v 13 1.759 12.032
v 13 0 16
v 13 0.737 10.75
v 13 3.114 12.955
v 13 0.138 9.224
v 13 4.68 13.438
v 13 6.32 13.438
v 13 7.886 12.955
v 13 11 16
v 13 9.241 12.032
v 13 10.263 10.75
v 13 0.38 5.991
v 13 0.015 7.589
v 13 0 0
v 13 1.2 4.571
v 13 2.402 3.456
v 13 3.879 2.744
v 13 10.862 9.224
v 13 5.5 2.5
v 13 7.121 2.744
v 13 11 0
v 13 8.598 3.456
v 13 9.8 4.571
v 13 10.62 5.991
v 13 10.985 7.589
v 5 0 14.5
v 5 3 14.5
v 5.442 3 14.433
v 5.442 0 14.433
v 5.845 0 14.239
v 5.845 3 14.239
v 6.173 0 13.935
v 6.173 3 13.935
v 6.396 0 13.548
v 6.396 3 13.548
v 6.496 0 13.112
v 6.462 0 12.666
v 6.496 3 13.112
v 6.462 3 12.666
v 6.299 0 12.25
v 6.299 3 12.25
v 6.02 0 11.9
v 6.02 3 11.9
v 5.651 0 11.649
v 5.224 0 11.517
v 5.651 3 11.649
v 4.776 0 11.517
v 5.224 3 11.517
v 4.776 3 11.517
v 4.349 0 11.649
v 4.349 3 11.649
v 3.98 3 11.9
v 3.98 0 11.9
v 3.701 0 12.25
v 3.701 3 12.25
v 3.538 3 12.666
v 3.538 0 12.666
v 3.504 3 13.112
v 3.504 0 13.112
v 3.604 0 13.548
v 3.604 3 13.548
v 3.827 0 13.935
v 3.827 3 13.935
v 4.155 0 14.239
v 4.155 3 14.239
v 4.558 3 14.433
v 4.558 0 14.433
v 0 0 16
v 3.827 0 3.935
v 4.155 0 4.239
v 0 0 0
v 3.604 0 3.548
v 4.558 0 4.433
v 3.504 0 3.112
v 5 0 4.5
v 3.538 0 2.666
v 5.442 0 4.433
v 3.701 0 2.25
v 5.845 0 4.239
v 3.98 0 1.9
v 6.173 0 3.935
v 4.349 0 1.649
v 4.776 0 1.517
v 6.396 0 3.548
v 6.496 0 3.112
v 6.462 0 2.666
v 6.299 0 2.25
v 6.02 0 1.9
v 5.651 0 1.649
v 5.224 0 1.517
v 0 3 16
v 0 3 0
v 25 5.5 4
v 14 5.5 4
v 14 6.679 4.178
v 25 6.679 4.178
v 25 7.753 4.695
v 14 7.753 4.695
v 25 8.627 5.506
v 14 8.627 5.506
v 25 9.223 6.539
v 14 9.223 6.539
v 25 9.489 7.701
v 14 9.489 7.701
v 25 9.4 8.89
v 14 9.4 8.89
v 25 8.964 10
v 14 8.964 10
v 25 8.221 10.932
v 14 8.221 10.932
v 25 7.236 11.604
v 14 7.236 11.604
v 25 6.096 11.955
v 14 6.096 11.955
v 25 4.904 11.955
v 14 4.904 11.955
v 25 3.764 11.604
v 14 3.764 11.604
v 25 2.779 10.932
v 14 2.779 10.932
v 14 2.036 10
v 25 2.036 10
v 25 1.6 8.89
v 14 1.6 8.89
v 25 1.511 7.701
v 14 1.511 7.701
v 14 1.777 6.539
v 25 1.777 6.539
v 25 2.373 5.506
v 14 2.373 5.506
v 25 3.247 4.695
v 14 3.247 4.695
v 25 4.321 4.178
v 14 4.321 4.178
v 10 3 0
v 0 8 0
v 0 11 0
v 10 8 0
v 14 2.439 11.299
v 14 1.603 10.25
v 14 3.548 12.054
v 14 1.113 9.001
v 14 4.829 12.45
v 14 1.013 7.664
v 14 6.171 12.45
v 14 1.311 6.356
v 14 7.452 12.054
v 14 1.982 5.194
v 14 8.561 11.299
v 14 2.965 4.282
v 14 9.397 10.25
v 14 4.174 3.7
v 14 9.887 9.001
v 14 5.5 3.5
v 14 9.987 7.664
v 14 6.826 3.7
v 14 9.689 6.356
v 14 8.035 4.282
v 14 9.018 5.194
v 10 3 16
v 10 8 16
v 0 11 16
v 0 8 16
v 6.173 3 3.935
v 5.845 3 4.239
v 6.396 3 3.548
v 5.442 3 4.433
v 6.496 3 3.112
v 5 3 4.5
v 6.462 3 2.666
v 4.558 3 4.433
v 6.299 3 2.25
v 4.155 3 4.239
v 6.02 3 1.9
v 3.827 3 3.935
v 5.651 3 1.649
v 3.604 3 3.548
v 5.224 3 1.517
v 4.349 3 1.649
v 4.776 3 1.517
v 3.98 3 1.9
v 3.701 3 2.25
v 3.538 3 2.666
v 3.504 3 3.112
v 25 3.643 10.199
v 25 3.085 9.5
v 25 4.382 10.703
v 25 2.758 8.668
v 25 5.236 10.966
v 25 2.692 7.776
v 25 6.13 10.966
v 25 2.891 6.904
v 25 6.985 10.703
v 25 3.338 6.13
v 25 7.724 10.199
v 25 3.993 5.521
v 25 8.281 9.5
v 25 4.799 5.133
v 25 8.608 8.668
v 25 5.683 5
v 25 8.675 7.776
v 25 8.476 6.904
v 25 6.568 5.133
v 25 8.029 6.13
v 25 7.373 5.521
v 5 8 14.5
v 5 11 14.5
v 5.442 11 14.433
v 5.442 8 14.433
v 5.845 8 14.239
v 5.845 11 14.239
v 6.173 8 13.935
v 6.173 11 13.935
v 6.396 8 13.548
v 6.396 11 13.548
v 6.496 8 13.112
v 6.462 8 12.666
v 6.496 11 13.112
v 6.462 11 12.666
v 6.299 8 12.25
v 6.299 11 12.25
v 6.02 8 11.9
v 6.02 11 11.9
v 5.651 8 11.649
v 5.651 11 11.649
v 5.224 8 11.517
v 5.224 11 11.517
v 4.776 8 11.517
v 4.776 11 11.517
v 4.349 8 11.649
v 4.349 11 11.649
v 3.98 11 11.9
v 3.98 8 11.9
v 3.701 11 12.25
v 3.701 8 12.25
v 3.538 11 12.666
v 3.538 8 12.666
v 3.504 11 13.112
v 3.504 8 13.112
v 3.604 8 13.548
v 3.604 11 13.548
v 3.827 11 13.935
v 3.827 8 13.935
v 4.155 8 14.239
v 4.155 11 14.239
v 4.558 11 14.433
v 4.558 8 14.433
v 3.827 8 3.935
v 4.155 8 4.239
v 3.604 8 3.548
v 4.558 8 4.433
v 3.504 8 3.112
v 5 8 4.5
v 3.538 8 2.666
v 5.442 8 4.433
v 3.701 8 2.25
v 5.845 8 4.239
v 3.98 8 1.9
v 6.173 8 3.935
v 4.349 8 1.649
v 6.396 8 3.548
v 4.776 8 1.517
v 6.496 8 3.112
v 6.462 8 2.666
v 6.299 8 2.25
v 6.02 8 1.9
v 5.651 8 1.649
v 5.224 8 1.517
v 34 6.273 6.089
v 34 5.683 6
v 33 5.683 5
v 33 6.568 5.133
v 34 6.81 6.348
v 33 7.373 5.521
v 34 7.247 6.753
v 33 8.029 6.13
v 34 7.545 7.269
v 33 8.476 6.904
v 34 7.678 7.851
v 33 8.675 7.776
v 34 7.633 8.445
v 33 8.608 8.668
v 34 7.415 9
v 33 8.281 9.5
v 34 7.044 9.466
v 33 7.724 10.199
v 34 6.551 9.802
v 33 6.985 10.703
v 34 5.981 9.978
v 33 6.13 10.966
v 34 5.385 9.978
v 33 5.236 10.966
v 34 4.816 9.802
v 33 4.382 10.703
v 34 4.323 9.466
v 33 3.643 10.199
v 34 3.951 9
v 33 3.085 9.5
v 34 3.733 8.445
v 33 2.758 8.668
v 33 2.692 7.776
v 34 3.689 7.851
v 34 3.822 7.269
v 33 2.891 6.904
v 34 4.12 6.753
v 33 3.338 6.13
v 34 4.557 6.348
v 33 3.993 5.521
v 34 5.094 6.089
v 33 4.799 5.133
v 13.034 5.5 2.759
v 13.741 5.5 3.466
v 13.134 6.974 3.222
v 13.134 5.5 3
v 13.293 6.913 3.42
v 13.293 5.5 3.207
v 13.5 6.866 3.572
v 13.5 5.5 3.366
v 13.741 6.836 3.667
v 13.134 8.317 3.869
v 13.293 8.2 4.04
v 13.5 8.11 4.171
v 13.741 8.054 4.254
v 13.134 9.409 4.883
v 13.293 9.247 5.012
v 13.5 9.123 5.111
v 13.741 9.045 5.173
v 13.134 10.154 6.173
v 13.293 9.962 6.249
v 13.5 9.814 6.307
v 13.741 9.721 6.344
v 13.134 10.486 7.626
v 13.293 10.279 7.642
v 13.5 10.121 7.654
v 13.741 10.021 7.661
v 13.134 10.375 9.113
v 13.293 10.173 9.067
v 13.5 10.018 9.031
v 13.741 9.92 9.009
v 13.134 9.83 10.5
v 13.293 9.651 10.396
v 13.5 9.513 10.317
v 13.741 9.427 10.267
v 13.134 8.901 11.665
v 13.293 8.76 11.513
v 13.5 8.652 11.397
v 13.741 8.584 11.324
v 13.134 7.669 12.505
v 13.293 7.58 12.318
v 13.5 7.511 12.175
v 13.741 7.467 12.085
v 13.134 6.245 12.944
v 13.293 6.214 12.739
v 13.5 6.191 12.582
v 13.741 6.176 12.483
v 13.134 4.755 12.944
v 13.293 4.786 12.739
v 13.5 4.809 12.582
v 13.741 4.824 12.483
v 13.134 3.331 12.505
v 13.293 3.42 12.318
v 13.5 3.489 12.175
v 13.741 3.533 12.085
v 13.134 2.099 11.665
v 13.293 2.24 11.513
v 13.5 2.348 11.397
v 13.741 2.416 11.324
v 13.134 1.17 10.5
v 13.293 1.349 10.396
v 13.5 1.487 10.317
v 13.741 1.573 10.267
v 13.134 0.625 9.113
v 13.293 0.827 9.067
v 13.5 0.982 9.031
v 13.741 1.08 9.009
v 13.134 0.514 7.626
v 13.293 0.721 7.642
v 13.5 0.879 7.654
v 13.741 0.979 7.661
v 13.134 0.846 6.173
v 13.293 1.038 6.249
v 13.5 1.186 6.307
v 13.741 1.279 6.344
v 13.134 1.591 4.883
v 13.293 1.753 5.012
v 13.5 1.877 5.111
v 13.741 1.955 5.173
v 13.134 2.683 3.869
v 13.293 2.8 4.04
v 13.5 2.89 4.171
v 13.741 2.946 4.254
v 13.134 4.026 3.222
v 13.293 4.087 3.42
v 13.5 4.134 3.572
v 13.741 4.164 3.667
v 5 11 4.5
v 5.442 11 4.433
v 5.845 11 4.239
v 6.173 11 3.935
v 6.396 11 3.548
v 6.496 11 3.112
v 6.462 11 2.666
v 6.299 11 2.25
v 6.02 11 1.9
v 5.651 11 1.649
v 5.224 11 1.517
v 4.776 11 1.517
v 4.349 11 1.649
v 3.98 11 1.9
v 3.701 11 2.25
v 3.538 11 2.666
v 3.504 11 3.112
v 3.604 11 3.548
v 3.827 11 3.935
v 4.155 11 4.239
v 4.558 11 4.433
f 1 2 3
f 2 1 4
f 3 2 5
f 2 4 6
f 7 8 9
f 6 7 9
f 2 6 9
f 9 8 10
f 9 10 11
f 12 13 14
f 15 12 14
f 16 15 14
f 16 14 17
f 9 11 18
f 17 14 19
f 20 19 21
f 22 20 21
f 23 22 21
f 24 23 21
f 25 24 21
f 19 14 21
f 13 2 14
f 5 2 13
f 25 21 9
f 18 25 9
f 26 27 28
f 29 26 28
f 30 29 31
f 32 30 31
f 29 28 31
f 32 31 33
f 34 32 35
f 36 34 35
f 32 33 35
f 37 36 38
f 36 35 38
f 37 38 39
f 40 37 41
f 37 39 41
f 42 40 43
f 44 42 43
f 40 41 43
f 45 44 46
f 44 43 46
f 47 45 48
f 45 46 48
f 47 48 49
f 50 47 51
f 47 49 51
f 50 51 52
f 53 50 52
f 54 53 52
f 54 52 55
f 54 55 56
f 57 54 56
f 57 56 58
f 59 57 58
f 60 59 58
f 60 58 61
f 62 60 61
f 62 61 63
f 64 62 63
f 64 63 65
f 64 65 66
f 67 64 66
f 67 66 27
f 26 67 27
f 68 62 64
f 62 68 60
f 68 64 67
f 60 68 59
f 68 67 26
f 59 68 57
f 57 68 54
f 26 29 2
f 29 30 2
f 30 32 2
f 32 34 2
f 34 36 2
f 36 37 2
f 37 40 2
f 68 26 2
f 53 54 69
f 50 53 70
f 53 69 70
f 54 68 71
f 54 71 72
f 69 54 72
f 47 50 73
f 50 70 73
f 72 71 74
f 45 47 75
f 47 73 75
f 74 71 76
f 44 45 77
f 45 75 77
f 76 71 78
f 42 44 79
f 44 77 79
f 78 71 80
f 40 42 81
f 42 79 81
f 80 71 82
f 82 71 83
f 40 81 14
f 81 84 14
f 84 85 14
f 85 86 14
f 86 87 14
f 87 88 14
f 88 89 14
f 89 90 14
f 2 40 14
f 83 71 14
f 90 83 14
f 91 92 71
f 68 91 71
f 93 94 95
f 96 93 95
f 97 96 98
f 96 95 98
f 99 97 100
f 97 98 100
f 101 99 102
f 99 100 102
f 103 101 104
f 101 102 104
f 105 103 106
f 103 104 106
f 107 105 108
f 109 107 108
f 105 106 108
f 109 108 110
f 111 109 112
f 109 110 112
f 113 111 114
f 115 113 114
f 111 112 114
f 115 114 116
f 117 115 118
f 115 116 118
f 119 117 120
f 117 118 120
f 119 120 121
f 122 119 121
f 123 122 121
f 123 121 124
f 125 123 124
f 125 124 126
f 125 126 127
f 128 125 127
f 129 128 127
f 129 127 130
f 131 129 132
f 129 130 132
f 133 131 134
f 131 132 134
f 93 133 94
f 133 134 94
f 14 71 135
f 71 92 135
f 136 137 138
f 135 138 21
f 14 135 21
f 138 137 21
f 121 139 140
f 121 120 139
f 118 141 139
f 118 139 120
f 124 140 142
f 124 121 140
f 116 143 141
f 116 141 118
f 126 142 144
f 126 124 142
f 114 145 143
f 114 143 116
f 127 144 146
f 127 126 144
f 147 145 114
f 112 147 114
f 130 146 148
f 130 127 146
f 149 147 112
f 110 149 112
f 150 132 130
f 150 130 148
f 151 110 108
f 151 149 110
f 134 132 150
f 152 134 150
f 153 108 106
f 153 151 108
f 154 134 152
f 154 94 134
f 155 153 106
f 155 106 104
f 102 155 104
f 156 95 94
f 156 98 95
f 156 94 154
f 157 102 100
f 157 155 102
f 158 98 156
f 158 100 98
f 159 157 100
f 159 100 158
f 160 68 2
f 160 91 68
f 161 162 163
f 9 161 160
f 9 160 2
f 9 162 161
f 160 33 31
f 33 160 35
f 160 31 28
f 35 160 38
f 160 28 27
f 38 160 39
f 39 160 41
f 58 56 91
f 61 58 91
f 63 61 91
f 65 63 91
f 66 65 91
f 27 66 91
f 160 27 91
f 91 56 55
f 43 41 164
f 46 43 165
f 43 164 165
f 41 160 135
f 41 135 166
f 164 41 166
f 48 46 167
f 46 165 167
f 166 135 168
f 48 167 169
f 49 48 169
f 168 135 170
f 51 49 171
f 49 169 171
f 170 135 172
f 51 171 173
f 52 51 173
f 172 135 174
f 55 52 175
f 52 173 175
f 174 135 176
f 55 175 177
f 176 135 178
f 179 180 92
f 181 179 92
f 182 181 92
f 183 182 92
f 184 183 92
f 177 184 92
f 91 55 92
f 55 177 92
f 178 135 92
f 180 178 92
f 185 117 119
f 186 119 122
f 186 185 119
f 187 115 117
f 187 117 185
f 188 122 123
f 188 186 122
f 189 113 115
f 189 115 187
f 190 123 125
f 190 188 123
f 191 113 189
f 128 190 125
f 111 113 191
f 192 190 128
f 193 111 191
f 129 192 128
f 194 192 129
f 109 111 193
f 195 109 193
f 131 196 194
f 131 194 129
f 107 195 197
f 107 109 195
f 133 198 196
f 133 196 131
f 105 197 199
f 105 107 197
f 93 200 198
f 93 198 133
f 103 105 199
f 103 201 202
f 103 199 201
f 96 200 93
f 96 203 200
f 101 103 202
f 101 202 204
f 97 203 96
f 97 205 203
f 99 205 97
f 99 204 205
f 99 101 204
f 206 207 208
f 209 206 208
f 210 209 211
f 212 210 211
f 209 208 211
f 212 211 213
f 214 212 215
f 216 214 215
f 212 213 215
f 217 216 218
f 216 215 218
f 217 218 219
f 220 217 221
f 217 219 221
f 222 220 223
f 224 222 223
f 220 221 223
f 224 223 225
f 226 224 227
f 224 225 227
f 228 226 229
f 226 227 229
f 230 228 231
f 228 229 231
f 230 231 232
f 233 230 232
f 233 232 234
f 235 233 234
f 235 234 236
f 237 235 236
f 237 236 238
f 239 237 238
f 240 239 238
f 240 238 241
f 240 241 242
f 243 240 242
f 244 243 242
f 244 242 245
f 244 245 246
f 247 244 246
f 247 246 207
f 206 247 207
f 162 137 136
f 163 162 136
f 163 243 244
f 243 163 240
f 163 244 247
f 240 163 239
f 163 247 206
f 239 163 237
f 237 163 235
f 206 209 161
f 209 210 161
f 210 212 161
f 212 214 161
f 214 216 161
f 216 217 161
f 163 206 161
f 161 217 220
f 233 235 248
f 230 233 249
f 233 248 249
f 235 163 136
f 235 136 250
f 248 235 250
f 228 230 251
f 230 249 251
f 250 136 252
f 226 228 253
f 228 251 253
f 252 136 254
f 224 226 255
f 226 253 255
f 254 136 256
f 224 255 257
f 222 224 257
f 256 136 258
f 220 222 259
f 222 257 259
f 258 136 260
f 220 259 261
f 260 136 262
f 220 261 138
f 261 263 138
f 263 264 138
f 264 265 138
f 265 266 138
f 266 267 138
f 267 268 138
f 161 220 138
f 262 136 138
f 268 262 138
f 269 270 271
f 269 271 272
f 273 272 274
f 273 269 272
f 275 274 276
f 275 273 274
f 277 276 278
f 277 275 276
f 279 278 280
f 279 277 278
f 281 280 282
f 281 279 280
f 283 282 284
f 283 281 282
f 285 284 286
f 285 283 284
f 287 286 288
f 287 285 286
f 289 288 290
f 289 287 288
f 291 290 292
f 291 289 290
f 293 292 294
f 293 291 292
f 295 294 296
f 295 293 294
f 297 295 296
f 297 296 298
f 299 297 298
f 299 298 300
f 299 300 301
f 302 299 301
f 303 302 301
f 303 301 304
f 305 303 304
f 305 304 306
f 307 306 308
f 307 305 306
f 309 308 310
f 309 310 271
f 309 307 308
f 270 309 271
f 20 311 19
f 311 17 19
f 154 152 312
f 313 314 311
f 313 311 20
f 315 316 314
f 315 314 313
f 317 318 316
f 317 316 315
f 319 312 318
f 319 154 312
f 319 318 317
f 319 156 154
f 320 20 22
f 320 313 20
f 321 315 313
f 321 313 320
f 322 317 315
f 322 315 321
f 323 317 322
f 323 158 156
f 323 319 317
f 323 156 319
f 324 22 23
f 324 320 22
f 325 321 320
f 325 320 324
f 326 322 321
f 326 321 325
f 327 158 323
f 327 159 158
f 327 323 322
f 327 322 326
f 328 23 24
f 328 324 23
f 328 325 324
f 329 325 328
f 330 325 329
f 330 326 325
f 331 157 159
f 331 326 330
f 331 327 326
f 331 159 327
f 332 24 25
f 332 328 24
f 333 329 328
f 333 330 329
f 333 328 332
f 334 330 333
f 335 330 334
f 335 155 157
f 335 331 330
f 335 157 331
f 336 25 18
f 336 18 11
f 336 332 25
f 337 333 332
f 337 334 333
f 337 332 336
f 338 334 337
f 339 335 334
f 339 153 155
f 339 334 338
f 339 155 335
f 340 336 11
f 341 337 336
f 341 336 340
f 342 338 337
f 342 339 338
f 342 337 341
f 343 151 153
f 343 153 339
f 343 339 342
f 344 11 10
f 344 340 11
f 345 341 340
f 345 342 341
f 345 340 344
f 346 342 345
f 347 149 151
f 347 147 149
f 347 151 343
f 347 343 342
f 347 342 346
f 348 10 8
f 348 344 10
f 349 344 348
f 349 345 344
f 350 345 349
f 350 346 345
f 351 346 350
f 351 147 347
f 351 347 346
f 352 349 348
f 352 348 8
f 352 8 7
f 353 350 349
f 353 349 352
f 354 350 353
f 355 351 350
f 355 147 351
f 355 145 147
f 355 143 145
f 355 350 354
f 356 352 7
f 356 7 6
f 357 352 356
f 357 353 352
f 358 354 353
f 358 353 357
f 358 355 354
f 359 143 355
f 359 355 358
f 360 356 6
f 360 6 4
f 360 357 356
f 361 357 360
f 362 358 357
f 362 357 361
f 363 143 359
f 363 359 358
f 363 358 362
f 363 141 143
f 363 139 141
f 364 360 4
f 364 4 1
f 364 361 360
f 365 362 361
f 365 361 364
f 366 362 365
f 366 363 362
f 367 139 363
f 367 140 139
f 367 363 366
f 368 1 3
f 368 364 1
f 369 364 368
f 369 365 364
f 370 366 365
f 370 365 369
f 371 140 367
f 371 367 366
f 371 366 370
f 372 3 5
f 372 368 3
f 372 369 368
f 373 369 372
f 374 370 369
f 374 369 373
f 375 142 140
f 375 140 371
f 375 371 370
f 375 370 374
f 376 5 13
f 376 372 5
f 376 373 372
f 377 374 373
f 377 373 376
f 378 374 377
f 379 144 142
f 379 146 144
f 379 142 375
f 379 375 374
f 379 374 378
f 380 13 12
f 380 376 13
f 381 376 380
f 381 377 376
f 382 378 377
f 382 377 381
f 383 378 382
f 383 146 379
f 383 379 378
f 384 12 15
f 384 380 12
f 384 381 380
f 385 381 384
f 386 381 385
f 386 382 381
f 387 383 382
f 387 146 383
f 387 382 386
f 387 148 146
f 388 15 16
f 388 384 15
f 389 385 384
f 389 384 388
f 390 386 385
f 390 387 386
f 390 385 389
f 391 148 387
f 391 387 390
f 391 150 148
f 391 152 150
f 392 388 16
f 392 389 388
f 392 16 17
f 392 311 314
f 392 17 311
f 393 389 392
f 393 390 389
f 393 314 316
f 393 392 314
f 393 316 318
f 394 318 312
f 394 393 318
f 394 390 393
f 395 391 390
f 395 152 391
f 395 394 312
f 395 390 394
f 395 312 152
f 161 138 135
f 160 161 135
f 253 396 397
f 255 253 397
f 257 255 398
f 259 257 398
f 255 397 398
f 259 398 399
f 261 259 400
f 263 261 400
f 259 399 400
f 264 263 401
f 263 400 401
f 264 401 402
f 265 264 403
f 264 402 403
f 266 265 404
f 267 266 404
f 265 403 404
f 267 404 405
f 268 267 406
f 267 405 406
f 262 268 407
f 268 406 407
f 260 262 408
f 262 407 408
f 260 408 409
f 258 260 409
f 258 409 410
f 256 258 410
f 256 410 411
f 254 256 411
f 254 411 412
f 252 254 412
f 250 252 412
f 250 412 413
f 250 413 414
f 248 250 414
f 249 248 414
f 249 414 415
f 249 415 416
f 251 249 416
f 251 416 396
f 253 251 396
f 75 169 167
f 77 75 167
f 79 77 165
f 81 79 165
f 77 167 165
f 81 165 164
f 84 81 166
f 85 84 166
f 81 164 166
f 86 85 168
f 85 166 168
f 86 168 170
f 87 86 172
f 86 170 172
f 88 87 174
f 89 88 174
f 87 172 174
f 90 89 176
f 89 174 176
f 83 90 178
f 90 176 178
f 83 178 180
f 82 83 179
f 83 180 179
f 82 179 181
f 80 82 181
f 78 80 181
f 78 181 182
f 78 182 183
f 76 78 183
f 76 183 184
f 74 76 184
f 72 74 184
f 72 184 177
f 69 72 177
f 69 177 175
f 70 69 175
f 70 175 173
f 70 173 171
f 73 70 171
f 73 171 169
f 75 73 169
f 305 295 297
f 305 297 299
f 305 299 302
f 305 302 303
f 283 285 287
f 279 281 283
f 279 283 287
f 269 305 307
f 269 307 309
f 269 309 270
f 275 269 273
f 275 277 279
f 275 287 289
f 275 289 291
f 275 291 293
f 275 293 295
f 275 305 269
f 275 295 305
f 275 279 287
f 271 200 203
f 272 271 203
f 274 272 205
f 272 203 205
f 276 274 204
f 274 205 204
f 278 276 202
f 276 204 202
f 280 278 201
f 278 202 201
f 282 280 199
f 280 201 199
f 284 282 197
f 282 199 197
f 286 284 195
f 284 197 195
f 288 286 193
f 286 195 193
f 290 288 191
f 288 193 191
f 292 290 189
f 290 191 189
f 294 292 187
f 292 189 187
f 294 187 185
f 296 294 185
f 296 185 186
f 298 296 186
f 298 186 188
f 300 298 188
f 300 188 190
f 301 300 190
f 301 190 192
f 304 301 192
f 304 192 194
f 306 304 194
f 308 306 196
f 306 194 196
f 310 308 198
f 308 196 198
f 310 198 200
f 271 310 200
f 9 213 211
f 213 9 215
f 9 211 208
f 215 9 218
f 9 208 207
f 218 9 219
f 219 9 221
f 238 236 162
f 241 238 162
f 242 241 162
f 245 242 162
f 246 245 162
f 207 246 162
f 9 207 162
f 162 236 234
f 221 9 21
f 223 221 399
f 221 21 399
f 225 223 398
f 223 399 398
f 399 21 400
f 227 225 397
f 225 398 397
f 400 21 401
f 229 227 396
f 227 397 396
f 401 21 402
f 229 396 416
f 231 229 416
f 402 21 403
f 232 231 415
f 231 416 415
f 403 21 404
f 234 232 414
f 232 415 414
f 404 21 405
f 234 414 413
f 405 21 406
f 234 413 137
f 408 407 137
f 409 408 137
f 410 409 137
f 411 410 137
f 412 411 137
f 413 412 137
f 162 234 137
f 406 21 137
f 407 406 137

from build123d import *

# Parameters (mm, degrees)
EXTRUDE_1_DEPTH     = 16
SKETCH_2_R          = 1.5
CUT_EXTRUDE_1_DEPTH = 16
SKETCH_3_R          = 4.5
EXTRUDE_2_DEPTH     = 1
FILLET_1_R          = 1
SKETCH_4_R          = 4
EXTRUDE_3_DEPTH     = 11
SKETCH_5_R          = 3
EXTRUDE_4_DEPTH     = 9
CHAMFER_1_SIZE      = 1


with BuildPart() as part:
    # 草图1 → 凸台-拉伸1 (new body)
    with BuildSketch(Plane.XY):
        Polygon((0, 0), (13, 0), (13, 11), (0, 11), (0, 8), (10, 8), (10, 3), (0, 3), align=None)
    extrude(amount=EXTRUDE_1_DEPTH)

    # 草图2 → 切除-拉伸1 (cut)
    with BuildSketch(Plane(origin=(0, 11, 0), x_dir=(1, 0, 0), z_dir=(0, 1, 0))):
        with Locations(Location((5, -3, 0), (0, 0, 270))):
            Circle(SKETCH_2_R)
        with Locations(Location((5, -13, 0), (0, 0, 270))):
            Circle(SKETCH_2_R)
    extrude(amount=-CUT_EXTRUDE_1_DEPTH, mode=Mode.SUBTRACT)

    # 草图3 → 凸台-拉伸2 (add)
    with BuildSketch(Plane(origin=(13, 0, 0), x_dir=(0, 0, -1), z_dir=(1, 0, 0))):
        with Locations((-8, 5.5)):
            Circle(SKETCH_3_R)
    extrude(amount=EXTRUDE_2_DEPTH)

    # 圆角1
    fillet_1_edges = [part.edges().sort_by_distance(p)[0] for p in [
        (13, 5.5, 12.5),
    ]]
    fillet(fillet_1_edges, radius=FILLET_1_R - 0.0001)  # a hair under: the kernel refuses the full size

    # 草图4 → 凸台-拉伸3 (add)
    with BuildSketch(Plane(origin=(14, 0, 0), x_dir=(0, 0, -1), z_dir=(1, 0, 0))):
        with Locations((-8, 5.5)):
            Circle(SKETCH_4_R)
    extrude(amount=EXTRUDE_3_DEPTH)

    # 草图5 → 凸台-拉伸4 (add)
    with BuildSketch(Plane(origin=(25, 0, 0), x_dir=(0, 0, -1), z_dir=(1, 0, 0))):
        with Locations((-8, 5.683281664)):
            Circle(SKETCH_5_R)
    extrude(amount=EXTRUDE_4_DEPTH)

    # 倒角1
    chamfer_1_edges = [part.edges().sort_by_distance(p)[0] for p in [
        (34, 5.683281664, 11),
    ]]
    chamfer(chamfer_1_edges, length=CHAMFER_1_SIZE)


solid = part.part
